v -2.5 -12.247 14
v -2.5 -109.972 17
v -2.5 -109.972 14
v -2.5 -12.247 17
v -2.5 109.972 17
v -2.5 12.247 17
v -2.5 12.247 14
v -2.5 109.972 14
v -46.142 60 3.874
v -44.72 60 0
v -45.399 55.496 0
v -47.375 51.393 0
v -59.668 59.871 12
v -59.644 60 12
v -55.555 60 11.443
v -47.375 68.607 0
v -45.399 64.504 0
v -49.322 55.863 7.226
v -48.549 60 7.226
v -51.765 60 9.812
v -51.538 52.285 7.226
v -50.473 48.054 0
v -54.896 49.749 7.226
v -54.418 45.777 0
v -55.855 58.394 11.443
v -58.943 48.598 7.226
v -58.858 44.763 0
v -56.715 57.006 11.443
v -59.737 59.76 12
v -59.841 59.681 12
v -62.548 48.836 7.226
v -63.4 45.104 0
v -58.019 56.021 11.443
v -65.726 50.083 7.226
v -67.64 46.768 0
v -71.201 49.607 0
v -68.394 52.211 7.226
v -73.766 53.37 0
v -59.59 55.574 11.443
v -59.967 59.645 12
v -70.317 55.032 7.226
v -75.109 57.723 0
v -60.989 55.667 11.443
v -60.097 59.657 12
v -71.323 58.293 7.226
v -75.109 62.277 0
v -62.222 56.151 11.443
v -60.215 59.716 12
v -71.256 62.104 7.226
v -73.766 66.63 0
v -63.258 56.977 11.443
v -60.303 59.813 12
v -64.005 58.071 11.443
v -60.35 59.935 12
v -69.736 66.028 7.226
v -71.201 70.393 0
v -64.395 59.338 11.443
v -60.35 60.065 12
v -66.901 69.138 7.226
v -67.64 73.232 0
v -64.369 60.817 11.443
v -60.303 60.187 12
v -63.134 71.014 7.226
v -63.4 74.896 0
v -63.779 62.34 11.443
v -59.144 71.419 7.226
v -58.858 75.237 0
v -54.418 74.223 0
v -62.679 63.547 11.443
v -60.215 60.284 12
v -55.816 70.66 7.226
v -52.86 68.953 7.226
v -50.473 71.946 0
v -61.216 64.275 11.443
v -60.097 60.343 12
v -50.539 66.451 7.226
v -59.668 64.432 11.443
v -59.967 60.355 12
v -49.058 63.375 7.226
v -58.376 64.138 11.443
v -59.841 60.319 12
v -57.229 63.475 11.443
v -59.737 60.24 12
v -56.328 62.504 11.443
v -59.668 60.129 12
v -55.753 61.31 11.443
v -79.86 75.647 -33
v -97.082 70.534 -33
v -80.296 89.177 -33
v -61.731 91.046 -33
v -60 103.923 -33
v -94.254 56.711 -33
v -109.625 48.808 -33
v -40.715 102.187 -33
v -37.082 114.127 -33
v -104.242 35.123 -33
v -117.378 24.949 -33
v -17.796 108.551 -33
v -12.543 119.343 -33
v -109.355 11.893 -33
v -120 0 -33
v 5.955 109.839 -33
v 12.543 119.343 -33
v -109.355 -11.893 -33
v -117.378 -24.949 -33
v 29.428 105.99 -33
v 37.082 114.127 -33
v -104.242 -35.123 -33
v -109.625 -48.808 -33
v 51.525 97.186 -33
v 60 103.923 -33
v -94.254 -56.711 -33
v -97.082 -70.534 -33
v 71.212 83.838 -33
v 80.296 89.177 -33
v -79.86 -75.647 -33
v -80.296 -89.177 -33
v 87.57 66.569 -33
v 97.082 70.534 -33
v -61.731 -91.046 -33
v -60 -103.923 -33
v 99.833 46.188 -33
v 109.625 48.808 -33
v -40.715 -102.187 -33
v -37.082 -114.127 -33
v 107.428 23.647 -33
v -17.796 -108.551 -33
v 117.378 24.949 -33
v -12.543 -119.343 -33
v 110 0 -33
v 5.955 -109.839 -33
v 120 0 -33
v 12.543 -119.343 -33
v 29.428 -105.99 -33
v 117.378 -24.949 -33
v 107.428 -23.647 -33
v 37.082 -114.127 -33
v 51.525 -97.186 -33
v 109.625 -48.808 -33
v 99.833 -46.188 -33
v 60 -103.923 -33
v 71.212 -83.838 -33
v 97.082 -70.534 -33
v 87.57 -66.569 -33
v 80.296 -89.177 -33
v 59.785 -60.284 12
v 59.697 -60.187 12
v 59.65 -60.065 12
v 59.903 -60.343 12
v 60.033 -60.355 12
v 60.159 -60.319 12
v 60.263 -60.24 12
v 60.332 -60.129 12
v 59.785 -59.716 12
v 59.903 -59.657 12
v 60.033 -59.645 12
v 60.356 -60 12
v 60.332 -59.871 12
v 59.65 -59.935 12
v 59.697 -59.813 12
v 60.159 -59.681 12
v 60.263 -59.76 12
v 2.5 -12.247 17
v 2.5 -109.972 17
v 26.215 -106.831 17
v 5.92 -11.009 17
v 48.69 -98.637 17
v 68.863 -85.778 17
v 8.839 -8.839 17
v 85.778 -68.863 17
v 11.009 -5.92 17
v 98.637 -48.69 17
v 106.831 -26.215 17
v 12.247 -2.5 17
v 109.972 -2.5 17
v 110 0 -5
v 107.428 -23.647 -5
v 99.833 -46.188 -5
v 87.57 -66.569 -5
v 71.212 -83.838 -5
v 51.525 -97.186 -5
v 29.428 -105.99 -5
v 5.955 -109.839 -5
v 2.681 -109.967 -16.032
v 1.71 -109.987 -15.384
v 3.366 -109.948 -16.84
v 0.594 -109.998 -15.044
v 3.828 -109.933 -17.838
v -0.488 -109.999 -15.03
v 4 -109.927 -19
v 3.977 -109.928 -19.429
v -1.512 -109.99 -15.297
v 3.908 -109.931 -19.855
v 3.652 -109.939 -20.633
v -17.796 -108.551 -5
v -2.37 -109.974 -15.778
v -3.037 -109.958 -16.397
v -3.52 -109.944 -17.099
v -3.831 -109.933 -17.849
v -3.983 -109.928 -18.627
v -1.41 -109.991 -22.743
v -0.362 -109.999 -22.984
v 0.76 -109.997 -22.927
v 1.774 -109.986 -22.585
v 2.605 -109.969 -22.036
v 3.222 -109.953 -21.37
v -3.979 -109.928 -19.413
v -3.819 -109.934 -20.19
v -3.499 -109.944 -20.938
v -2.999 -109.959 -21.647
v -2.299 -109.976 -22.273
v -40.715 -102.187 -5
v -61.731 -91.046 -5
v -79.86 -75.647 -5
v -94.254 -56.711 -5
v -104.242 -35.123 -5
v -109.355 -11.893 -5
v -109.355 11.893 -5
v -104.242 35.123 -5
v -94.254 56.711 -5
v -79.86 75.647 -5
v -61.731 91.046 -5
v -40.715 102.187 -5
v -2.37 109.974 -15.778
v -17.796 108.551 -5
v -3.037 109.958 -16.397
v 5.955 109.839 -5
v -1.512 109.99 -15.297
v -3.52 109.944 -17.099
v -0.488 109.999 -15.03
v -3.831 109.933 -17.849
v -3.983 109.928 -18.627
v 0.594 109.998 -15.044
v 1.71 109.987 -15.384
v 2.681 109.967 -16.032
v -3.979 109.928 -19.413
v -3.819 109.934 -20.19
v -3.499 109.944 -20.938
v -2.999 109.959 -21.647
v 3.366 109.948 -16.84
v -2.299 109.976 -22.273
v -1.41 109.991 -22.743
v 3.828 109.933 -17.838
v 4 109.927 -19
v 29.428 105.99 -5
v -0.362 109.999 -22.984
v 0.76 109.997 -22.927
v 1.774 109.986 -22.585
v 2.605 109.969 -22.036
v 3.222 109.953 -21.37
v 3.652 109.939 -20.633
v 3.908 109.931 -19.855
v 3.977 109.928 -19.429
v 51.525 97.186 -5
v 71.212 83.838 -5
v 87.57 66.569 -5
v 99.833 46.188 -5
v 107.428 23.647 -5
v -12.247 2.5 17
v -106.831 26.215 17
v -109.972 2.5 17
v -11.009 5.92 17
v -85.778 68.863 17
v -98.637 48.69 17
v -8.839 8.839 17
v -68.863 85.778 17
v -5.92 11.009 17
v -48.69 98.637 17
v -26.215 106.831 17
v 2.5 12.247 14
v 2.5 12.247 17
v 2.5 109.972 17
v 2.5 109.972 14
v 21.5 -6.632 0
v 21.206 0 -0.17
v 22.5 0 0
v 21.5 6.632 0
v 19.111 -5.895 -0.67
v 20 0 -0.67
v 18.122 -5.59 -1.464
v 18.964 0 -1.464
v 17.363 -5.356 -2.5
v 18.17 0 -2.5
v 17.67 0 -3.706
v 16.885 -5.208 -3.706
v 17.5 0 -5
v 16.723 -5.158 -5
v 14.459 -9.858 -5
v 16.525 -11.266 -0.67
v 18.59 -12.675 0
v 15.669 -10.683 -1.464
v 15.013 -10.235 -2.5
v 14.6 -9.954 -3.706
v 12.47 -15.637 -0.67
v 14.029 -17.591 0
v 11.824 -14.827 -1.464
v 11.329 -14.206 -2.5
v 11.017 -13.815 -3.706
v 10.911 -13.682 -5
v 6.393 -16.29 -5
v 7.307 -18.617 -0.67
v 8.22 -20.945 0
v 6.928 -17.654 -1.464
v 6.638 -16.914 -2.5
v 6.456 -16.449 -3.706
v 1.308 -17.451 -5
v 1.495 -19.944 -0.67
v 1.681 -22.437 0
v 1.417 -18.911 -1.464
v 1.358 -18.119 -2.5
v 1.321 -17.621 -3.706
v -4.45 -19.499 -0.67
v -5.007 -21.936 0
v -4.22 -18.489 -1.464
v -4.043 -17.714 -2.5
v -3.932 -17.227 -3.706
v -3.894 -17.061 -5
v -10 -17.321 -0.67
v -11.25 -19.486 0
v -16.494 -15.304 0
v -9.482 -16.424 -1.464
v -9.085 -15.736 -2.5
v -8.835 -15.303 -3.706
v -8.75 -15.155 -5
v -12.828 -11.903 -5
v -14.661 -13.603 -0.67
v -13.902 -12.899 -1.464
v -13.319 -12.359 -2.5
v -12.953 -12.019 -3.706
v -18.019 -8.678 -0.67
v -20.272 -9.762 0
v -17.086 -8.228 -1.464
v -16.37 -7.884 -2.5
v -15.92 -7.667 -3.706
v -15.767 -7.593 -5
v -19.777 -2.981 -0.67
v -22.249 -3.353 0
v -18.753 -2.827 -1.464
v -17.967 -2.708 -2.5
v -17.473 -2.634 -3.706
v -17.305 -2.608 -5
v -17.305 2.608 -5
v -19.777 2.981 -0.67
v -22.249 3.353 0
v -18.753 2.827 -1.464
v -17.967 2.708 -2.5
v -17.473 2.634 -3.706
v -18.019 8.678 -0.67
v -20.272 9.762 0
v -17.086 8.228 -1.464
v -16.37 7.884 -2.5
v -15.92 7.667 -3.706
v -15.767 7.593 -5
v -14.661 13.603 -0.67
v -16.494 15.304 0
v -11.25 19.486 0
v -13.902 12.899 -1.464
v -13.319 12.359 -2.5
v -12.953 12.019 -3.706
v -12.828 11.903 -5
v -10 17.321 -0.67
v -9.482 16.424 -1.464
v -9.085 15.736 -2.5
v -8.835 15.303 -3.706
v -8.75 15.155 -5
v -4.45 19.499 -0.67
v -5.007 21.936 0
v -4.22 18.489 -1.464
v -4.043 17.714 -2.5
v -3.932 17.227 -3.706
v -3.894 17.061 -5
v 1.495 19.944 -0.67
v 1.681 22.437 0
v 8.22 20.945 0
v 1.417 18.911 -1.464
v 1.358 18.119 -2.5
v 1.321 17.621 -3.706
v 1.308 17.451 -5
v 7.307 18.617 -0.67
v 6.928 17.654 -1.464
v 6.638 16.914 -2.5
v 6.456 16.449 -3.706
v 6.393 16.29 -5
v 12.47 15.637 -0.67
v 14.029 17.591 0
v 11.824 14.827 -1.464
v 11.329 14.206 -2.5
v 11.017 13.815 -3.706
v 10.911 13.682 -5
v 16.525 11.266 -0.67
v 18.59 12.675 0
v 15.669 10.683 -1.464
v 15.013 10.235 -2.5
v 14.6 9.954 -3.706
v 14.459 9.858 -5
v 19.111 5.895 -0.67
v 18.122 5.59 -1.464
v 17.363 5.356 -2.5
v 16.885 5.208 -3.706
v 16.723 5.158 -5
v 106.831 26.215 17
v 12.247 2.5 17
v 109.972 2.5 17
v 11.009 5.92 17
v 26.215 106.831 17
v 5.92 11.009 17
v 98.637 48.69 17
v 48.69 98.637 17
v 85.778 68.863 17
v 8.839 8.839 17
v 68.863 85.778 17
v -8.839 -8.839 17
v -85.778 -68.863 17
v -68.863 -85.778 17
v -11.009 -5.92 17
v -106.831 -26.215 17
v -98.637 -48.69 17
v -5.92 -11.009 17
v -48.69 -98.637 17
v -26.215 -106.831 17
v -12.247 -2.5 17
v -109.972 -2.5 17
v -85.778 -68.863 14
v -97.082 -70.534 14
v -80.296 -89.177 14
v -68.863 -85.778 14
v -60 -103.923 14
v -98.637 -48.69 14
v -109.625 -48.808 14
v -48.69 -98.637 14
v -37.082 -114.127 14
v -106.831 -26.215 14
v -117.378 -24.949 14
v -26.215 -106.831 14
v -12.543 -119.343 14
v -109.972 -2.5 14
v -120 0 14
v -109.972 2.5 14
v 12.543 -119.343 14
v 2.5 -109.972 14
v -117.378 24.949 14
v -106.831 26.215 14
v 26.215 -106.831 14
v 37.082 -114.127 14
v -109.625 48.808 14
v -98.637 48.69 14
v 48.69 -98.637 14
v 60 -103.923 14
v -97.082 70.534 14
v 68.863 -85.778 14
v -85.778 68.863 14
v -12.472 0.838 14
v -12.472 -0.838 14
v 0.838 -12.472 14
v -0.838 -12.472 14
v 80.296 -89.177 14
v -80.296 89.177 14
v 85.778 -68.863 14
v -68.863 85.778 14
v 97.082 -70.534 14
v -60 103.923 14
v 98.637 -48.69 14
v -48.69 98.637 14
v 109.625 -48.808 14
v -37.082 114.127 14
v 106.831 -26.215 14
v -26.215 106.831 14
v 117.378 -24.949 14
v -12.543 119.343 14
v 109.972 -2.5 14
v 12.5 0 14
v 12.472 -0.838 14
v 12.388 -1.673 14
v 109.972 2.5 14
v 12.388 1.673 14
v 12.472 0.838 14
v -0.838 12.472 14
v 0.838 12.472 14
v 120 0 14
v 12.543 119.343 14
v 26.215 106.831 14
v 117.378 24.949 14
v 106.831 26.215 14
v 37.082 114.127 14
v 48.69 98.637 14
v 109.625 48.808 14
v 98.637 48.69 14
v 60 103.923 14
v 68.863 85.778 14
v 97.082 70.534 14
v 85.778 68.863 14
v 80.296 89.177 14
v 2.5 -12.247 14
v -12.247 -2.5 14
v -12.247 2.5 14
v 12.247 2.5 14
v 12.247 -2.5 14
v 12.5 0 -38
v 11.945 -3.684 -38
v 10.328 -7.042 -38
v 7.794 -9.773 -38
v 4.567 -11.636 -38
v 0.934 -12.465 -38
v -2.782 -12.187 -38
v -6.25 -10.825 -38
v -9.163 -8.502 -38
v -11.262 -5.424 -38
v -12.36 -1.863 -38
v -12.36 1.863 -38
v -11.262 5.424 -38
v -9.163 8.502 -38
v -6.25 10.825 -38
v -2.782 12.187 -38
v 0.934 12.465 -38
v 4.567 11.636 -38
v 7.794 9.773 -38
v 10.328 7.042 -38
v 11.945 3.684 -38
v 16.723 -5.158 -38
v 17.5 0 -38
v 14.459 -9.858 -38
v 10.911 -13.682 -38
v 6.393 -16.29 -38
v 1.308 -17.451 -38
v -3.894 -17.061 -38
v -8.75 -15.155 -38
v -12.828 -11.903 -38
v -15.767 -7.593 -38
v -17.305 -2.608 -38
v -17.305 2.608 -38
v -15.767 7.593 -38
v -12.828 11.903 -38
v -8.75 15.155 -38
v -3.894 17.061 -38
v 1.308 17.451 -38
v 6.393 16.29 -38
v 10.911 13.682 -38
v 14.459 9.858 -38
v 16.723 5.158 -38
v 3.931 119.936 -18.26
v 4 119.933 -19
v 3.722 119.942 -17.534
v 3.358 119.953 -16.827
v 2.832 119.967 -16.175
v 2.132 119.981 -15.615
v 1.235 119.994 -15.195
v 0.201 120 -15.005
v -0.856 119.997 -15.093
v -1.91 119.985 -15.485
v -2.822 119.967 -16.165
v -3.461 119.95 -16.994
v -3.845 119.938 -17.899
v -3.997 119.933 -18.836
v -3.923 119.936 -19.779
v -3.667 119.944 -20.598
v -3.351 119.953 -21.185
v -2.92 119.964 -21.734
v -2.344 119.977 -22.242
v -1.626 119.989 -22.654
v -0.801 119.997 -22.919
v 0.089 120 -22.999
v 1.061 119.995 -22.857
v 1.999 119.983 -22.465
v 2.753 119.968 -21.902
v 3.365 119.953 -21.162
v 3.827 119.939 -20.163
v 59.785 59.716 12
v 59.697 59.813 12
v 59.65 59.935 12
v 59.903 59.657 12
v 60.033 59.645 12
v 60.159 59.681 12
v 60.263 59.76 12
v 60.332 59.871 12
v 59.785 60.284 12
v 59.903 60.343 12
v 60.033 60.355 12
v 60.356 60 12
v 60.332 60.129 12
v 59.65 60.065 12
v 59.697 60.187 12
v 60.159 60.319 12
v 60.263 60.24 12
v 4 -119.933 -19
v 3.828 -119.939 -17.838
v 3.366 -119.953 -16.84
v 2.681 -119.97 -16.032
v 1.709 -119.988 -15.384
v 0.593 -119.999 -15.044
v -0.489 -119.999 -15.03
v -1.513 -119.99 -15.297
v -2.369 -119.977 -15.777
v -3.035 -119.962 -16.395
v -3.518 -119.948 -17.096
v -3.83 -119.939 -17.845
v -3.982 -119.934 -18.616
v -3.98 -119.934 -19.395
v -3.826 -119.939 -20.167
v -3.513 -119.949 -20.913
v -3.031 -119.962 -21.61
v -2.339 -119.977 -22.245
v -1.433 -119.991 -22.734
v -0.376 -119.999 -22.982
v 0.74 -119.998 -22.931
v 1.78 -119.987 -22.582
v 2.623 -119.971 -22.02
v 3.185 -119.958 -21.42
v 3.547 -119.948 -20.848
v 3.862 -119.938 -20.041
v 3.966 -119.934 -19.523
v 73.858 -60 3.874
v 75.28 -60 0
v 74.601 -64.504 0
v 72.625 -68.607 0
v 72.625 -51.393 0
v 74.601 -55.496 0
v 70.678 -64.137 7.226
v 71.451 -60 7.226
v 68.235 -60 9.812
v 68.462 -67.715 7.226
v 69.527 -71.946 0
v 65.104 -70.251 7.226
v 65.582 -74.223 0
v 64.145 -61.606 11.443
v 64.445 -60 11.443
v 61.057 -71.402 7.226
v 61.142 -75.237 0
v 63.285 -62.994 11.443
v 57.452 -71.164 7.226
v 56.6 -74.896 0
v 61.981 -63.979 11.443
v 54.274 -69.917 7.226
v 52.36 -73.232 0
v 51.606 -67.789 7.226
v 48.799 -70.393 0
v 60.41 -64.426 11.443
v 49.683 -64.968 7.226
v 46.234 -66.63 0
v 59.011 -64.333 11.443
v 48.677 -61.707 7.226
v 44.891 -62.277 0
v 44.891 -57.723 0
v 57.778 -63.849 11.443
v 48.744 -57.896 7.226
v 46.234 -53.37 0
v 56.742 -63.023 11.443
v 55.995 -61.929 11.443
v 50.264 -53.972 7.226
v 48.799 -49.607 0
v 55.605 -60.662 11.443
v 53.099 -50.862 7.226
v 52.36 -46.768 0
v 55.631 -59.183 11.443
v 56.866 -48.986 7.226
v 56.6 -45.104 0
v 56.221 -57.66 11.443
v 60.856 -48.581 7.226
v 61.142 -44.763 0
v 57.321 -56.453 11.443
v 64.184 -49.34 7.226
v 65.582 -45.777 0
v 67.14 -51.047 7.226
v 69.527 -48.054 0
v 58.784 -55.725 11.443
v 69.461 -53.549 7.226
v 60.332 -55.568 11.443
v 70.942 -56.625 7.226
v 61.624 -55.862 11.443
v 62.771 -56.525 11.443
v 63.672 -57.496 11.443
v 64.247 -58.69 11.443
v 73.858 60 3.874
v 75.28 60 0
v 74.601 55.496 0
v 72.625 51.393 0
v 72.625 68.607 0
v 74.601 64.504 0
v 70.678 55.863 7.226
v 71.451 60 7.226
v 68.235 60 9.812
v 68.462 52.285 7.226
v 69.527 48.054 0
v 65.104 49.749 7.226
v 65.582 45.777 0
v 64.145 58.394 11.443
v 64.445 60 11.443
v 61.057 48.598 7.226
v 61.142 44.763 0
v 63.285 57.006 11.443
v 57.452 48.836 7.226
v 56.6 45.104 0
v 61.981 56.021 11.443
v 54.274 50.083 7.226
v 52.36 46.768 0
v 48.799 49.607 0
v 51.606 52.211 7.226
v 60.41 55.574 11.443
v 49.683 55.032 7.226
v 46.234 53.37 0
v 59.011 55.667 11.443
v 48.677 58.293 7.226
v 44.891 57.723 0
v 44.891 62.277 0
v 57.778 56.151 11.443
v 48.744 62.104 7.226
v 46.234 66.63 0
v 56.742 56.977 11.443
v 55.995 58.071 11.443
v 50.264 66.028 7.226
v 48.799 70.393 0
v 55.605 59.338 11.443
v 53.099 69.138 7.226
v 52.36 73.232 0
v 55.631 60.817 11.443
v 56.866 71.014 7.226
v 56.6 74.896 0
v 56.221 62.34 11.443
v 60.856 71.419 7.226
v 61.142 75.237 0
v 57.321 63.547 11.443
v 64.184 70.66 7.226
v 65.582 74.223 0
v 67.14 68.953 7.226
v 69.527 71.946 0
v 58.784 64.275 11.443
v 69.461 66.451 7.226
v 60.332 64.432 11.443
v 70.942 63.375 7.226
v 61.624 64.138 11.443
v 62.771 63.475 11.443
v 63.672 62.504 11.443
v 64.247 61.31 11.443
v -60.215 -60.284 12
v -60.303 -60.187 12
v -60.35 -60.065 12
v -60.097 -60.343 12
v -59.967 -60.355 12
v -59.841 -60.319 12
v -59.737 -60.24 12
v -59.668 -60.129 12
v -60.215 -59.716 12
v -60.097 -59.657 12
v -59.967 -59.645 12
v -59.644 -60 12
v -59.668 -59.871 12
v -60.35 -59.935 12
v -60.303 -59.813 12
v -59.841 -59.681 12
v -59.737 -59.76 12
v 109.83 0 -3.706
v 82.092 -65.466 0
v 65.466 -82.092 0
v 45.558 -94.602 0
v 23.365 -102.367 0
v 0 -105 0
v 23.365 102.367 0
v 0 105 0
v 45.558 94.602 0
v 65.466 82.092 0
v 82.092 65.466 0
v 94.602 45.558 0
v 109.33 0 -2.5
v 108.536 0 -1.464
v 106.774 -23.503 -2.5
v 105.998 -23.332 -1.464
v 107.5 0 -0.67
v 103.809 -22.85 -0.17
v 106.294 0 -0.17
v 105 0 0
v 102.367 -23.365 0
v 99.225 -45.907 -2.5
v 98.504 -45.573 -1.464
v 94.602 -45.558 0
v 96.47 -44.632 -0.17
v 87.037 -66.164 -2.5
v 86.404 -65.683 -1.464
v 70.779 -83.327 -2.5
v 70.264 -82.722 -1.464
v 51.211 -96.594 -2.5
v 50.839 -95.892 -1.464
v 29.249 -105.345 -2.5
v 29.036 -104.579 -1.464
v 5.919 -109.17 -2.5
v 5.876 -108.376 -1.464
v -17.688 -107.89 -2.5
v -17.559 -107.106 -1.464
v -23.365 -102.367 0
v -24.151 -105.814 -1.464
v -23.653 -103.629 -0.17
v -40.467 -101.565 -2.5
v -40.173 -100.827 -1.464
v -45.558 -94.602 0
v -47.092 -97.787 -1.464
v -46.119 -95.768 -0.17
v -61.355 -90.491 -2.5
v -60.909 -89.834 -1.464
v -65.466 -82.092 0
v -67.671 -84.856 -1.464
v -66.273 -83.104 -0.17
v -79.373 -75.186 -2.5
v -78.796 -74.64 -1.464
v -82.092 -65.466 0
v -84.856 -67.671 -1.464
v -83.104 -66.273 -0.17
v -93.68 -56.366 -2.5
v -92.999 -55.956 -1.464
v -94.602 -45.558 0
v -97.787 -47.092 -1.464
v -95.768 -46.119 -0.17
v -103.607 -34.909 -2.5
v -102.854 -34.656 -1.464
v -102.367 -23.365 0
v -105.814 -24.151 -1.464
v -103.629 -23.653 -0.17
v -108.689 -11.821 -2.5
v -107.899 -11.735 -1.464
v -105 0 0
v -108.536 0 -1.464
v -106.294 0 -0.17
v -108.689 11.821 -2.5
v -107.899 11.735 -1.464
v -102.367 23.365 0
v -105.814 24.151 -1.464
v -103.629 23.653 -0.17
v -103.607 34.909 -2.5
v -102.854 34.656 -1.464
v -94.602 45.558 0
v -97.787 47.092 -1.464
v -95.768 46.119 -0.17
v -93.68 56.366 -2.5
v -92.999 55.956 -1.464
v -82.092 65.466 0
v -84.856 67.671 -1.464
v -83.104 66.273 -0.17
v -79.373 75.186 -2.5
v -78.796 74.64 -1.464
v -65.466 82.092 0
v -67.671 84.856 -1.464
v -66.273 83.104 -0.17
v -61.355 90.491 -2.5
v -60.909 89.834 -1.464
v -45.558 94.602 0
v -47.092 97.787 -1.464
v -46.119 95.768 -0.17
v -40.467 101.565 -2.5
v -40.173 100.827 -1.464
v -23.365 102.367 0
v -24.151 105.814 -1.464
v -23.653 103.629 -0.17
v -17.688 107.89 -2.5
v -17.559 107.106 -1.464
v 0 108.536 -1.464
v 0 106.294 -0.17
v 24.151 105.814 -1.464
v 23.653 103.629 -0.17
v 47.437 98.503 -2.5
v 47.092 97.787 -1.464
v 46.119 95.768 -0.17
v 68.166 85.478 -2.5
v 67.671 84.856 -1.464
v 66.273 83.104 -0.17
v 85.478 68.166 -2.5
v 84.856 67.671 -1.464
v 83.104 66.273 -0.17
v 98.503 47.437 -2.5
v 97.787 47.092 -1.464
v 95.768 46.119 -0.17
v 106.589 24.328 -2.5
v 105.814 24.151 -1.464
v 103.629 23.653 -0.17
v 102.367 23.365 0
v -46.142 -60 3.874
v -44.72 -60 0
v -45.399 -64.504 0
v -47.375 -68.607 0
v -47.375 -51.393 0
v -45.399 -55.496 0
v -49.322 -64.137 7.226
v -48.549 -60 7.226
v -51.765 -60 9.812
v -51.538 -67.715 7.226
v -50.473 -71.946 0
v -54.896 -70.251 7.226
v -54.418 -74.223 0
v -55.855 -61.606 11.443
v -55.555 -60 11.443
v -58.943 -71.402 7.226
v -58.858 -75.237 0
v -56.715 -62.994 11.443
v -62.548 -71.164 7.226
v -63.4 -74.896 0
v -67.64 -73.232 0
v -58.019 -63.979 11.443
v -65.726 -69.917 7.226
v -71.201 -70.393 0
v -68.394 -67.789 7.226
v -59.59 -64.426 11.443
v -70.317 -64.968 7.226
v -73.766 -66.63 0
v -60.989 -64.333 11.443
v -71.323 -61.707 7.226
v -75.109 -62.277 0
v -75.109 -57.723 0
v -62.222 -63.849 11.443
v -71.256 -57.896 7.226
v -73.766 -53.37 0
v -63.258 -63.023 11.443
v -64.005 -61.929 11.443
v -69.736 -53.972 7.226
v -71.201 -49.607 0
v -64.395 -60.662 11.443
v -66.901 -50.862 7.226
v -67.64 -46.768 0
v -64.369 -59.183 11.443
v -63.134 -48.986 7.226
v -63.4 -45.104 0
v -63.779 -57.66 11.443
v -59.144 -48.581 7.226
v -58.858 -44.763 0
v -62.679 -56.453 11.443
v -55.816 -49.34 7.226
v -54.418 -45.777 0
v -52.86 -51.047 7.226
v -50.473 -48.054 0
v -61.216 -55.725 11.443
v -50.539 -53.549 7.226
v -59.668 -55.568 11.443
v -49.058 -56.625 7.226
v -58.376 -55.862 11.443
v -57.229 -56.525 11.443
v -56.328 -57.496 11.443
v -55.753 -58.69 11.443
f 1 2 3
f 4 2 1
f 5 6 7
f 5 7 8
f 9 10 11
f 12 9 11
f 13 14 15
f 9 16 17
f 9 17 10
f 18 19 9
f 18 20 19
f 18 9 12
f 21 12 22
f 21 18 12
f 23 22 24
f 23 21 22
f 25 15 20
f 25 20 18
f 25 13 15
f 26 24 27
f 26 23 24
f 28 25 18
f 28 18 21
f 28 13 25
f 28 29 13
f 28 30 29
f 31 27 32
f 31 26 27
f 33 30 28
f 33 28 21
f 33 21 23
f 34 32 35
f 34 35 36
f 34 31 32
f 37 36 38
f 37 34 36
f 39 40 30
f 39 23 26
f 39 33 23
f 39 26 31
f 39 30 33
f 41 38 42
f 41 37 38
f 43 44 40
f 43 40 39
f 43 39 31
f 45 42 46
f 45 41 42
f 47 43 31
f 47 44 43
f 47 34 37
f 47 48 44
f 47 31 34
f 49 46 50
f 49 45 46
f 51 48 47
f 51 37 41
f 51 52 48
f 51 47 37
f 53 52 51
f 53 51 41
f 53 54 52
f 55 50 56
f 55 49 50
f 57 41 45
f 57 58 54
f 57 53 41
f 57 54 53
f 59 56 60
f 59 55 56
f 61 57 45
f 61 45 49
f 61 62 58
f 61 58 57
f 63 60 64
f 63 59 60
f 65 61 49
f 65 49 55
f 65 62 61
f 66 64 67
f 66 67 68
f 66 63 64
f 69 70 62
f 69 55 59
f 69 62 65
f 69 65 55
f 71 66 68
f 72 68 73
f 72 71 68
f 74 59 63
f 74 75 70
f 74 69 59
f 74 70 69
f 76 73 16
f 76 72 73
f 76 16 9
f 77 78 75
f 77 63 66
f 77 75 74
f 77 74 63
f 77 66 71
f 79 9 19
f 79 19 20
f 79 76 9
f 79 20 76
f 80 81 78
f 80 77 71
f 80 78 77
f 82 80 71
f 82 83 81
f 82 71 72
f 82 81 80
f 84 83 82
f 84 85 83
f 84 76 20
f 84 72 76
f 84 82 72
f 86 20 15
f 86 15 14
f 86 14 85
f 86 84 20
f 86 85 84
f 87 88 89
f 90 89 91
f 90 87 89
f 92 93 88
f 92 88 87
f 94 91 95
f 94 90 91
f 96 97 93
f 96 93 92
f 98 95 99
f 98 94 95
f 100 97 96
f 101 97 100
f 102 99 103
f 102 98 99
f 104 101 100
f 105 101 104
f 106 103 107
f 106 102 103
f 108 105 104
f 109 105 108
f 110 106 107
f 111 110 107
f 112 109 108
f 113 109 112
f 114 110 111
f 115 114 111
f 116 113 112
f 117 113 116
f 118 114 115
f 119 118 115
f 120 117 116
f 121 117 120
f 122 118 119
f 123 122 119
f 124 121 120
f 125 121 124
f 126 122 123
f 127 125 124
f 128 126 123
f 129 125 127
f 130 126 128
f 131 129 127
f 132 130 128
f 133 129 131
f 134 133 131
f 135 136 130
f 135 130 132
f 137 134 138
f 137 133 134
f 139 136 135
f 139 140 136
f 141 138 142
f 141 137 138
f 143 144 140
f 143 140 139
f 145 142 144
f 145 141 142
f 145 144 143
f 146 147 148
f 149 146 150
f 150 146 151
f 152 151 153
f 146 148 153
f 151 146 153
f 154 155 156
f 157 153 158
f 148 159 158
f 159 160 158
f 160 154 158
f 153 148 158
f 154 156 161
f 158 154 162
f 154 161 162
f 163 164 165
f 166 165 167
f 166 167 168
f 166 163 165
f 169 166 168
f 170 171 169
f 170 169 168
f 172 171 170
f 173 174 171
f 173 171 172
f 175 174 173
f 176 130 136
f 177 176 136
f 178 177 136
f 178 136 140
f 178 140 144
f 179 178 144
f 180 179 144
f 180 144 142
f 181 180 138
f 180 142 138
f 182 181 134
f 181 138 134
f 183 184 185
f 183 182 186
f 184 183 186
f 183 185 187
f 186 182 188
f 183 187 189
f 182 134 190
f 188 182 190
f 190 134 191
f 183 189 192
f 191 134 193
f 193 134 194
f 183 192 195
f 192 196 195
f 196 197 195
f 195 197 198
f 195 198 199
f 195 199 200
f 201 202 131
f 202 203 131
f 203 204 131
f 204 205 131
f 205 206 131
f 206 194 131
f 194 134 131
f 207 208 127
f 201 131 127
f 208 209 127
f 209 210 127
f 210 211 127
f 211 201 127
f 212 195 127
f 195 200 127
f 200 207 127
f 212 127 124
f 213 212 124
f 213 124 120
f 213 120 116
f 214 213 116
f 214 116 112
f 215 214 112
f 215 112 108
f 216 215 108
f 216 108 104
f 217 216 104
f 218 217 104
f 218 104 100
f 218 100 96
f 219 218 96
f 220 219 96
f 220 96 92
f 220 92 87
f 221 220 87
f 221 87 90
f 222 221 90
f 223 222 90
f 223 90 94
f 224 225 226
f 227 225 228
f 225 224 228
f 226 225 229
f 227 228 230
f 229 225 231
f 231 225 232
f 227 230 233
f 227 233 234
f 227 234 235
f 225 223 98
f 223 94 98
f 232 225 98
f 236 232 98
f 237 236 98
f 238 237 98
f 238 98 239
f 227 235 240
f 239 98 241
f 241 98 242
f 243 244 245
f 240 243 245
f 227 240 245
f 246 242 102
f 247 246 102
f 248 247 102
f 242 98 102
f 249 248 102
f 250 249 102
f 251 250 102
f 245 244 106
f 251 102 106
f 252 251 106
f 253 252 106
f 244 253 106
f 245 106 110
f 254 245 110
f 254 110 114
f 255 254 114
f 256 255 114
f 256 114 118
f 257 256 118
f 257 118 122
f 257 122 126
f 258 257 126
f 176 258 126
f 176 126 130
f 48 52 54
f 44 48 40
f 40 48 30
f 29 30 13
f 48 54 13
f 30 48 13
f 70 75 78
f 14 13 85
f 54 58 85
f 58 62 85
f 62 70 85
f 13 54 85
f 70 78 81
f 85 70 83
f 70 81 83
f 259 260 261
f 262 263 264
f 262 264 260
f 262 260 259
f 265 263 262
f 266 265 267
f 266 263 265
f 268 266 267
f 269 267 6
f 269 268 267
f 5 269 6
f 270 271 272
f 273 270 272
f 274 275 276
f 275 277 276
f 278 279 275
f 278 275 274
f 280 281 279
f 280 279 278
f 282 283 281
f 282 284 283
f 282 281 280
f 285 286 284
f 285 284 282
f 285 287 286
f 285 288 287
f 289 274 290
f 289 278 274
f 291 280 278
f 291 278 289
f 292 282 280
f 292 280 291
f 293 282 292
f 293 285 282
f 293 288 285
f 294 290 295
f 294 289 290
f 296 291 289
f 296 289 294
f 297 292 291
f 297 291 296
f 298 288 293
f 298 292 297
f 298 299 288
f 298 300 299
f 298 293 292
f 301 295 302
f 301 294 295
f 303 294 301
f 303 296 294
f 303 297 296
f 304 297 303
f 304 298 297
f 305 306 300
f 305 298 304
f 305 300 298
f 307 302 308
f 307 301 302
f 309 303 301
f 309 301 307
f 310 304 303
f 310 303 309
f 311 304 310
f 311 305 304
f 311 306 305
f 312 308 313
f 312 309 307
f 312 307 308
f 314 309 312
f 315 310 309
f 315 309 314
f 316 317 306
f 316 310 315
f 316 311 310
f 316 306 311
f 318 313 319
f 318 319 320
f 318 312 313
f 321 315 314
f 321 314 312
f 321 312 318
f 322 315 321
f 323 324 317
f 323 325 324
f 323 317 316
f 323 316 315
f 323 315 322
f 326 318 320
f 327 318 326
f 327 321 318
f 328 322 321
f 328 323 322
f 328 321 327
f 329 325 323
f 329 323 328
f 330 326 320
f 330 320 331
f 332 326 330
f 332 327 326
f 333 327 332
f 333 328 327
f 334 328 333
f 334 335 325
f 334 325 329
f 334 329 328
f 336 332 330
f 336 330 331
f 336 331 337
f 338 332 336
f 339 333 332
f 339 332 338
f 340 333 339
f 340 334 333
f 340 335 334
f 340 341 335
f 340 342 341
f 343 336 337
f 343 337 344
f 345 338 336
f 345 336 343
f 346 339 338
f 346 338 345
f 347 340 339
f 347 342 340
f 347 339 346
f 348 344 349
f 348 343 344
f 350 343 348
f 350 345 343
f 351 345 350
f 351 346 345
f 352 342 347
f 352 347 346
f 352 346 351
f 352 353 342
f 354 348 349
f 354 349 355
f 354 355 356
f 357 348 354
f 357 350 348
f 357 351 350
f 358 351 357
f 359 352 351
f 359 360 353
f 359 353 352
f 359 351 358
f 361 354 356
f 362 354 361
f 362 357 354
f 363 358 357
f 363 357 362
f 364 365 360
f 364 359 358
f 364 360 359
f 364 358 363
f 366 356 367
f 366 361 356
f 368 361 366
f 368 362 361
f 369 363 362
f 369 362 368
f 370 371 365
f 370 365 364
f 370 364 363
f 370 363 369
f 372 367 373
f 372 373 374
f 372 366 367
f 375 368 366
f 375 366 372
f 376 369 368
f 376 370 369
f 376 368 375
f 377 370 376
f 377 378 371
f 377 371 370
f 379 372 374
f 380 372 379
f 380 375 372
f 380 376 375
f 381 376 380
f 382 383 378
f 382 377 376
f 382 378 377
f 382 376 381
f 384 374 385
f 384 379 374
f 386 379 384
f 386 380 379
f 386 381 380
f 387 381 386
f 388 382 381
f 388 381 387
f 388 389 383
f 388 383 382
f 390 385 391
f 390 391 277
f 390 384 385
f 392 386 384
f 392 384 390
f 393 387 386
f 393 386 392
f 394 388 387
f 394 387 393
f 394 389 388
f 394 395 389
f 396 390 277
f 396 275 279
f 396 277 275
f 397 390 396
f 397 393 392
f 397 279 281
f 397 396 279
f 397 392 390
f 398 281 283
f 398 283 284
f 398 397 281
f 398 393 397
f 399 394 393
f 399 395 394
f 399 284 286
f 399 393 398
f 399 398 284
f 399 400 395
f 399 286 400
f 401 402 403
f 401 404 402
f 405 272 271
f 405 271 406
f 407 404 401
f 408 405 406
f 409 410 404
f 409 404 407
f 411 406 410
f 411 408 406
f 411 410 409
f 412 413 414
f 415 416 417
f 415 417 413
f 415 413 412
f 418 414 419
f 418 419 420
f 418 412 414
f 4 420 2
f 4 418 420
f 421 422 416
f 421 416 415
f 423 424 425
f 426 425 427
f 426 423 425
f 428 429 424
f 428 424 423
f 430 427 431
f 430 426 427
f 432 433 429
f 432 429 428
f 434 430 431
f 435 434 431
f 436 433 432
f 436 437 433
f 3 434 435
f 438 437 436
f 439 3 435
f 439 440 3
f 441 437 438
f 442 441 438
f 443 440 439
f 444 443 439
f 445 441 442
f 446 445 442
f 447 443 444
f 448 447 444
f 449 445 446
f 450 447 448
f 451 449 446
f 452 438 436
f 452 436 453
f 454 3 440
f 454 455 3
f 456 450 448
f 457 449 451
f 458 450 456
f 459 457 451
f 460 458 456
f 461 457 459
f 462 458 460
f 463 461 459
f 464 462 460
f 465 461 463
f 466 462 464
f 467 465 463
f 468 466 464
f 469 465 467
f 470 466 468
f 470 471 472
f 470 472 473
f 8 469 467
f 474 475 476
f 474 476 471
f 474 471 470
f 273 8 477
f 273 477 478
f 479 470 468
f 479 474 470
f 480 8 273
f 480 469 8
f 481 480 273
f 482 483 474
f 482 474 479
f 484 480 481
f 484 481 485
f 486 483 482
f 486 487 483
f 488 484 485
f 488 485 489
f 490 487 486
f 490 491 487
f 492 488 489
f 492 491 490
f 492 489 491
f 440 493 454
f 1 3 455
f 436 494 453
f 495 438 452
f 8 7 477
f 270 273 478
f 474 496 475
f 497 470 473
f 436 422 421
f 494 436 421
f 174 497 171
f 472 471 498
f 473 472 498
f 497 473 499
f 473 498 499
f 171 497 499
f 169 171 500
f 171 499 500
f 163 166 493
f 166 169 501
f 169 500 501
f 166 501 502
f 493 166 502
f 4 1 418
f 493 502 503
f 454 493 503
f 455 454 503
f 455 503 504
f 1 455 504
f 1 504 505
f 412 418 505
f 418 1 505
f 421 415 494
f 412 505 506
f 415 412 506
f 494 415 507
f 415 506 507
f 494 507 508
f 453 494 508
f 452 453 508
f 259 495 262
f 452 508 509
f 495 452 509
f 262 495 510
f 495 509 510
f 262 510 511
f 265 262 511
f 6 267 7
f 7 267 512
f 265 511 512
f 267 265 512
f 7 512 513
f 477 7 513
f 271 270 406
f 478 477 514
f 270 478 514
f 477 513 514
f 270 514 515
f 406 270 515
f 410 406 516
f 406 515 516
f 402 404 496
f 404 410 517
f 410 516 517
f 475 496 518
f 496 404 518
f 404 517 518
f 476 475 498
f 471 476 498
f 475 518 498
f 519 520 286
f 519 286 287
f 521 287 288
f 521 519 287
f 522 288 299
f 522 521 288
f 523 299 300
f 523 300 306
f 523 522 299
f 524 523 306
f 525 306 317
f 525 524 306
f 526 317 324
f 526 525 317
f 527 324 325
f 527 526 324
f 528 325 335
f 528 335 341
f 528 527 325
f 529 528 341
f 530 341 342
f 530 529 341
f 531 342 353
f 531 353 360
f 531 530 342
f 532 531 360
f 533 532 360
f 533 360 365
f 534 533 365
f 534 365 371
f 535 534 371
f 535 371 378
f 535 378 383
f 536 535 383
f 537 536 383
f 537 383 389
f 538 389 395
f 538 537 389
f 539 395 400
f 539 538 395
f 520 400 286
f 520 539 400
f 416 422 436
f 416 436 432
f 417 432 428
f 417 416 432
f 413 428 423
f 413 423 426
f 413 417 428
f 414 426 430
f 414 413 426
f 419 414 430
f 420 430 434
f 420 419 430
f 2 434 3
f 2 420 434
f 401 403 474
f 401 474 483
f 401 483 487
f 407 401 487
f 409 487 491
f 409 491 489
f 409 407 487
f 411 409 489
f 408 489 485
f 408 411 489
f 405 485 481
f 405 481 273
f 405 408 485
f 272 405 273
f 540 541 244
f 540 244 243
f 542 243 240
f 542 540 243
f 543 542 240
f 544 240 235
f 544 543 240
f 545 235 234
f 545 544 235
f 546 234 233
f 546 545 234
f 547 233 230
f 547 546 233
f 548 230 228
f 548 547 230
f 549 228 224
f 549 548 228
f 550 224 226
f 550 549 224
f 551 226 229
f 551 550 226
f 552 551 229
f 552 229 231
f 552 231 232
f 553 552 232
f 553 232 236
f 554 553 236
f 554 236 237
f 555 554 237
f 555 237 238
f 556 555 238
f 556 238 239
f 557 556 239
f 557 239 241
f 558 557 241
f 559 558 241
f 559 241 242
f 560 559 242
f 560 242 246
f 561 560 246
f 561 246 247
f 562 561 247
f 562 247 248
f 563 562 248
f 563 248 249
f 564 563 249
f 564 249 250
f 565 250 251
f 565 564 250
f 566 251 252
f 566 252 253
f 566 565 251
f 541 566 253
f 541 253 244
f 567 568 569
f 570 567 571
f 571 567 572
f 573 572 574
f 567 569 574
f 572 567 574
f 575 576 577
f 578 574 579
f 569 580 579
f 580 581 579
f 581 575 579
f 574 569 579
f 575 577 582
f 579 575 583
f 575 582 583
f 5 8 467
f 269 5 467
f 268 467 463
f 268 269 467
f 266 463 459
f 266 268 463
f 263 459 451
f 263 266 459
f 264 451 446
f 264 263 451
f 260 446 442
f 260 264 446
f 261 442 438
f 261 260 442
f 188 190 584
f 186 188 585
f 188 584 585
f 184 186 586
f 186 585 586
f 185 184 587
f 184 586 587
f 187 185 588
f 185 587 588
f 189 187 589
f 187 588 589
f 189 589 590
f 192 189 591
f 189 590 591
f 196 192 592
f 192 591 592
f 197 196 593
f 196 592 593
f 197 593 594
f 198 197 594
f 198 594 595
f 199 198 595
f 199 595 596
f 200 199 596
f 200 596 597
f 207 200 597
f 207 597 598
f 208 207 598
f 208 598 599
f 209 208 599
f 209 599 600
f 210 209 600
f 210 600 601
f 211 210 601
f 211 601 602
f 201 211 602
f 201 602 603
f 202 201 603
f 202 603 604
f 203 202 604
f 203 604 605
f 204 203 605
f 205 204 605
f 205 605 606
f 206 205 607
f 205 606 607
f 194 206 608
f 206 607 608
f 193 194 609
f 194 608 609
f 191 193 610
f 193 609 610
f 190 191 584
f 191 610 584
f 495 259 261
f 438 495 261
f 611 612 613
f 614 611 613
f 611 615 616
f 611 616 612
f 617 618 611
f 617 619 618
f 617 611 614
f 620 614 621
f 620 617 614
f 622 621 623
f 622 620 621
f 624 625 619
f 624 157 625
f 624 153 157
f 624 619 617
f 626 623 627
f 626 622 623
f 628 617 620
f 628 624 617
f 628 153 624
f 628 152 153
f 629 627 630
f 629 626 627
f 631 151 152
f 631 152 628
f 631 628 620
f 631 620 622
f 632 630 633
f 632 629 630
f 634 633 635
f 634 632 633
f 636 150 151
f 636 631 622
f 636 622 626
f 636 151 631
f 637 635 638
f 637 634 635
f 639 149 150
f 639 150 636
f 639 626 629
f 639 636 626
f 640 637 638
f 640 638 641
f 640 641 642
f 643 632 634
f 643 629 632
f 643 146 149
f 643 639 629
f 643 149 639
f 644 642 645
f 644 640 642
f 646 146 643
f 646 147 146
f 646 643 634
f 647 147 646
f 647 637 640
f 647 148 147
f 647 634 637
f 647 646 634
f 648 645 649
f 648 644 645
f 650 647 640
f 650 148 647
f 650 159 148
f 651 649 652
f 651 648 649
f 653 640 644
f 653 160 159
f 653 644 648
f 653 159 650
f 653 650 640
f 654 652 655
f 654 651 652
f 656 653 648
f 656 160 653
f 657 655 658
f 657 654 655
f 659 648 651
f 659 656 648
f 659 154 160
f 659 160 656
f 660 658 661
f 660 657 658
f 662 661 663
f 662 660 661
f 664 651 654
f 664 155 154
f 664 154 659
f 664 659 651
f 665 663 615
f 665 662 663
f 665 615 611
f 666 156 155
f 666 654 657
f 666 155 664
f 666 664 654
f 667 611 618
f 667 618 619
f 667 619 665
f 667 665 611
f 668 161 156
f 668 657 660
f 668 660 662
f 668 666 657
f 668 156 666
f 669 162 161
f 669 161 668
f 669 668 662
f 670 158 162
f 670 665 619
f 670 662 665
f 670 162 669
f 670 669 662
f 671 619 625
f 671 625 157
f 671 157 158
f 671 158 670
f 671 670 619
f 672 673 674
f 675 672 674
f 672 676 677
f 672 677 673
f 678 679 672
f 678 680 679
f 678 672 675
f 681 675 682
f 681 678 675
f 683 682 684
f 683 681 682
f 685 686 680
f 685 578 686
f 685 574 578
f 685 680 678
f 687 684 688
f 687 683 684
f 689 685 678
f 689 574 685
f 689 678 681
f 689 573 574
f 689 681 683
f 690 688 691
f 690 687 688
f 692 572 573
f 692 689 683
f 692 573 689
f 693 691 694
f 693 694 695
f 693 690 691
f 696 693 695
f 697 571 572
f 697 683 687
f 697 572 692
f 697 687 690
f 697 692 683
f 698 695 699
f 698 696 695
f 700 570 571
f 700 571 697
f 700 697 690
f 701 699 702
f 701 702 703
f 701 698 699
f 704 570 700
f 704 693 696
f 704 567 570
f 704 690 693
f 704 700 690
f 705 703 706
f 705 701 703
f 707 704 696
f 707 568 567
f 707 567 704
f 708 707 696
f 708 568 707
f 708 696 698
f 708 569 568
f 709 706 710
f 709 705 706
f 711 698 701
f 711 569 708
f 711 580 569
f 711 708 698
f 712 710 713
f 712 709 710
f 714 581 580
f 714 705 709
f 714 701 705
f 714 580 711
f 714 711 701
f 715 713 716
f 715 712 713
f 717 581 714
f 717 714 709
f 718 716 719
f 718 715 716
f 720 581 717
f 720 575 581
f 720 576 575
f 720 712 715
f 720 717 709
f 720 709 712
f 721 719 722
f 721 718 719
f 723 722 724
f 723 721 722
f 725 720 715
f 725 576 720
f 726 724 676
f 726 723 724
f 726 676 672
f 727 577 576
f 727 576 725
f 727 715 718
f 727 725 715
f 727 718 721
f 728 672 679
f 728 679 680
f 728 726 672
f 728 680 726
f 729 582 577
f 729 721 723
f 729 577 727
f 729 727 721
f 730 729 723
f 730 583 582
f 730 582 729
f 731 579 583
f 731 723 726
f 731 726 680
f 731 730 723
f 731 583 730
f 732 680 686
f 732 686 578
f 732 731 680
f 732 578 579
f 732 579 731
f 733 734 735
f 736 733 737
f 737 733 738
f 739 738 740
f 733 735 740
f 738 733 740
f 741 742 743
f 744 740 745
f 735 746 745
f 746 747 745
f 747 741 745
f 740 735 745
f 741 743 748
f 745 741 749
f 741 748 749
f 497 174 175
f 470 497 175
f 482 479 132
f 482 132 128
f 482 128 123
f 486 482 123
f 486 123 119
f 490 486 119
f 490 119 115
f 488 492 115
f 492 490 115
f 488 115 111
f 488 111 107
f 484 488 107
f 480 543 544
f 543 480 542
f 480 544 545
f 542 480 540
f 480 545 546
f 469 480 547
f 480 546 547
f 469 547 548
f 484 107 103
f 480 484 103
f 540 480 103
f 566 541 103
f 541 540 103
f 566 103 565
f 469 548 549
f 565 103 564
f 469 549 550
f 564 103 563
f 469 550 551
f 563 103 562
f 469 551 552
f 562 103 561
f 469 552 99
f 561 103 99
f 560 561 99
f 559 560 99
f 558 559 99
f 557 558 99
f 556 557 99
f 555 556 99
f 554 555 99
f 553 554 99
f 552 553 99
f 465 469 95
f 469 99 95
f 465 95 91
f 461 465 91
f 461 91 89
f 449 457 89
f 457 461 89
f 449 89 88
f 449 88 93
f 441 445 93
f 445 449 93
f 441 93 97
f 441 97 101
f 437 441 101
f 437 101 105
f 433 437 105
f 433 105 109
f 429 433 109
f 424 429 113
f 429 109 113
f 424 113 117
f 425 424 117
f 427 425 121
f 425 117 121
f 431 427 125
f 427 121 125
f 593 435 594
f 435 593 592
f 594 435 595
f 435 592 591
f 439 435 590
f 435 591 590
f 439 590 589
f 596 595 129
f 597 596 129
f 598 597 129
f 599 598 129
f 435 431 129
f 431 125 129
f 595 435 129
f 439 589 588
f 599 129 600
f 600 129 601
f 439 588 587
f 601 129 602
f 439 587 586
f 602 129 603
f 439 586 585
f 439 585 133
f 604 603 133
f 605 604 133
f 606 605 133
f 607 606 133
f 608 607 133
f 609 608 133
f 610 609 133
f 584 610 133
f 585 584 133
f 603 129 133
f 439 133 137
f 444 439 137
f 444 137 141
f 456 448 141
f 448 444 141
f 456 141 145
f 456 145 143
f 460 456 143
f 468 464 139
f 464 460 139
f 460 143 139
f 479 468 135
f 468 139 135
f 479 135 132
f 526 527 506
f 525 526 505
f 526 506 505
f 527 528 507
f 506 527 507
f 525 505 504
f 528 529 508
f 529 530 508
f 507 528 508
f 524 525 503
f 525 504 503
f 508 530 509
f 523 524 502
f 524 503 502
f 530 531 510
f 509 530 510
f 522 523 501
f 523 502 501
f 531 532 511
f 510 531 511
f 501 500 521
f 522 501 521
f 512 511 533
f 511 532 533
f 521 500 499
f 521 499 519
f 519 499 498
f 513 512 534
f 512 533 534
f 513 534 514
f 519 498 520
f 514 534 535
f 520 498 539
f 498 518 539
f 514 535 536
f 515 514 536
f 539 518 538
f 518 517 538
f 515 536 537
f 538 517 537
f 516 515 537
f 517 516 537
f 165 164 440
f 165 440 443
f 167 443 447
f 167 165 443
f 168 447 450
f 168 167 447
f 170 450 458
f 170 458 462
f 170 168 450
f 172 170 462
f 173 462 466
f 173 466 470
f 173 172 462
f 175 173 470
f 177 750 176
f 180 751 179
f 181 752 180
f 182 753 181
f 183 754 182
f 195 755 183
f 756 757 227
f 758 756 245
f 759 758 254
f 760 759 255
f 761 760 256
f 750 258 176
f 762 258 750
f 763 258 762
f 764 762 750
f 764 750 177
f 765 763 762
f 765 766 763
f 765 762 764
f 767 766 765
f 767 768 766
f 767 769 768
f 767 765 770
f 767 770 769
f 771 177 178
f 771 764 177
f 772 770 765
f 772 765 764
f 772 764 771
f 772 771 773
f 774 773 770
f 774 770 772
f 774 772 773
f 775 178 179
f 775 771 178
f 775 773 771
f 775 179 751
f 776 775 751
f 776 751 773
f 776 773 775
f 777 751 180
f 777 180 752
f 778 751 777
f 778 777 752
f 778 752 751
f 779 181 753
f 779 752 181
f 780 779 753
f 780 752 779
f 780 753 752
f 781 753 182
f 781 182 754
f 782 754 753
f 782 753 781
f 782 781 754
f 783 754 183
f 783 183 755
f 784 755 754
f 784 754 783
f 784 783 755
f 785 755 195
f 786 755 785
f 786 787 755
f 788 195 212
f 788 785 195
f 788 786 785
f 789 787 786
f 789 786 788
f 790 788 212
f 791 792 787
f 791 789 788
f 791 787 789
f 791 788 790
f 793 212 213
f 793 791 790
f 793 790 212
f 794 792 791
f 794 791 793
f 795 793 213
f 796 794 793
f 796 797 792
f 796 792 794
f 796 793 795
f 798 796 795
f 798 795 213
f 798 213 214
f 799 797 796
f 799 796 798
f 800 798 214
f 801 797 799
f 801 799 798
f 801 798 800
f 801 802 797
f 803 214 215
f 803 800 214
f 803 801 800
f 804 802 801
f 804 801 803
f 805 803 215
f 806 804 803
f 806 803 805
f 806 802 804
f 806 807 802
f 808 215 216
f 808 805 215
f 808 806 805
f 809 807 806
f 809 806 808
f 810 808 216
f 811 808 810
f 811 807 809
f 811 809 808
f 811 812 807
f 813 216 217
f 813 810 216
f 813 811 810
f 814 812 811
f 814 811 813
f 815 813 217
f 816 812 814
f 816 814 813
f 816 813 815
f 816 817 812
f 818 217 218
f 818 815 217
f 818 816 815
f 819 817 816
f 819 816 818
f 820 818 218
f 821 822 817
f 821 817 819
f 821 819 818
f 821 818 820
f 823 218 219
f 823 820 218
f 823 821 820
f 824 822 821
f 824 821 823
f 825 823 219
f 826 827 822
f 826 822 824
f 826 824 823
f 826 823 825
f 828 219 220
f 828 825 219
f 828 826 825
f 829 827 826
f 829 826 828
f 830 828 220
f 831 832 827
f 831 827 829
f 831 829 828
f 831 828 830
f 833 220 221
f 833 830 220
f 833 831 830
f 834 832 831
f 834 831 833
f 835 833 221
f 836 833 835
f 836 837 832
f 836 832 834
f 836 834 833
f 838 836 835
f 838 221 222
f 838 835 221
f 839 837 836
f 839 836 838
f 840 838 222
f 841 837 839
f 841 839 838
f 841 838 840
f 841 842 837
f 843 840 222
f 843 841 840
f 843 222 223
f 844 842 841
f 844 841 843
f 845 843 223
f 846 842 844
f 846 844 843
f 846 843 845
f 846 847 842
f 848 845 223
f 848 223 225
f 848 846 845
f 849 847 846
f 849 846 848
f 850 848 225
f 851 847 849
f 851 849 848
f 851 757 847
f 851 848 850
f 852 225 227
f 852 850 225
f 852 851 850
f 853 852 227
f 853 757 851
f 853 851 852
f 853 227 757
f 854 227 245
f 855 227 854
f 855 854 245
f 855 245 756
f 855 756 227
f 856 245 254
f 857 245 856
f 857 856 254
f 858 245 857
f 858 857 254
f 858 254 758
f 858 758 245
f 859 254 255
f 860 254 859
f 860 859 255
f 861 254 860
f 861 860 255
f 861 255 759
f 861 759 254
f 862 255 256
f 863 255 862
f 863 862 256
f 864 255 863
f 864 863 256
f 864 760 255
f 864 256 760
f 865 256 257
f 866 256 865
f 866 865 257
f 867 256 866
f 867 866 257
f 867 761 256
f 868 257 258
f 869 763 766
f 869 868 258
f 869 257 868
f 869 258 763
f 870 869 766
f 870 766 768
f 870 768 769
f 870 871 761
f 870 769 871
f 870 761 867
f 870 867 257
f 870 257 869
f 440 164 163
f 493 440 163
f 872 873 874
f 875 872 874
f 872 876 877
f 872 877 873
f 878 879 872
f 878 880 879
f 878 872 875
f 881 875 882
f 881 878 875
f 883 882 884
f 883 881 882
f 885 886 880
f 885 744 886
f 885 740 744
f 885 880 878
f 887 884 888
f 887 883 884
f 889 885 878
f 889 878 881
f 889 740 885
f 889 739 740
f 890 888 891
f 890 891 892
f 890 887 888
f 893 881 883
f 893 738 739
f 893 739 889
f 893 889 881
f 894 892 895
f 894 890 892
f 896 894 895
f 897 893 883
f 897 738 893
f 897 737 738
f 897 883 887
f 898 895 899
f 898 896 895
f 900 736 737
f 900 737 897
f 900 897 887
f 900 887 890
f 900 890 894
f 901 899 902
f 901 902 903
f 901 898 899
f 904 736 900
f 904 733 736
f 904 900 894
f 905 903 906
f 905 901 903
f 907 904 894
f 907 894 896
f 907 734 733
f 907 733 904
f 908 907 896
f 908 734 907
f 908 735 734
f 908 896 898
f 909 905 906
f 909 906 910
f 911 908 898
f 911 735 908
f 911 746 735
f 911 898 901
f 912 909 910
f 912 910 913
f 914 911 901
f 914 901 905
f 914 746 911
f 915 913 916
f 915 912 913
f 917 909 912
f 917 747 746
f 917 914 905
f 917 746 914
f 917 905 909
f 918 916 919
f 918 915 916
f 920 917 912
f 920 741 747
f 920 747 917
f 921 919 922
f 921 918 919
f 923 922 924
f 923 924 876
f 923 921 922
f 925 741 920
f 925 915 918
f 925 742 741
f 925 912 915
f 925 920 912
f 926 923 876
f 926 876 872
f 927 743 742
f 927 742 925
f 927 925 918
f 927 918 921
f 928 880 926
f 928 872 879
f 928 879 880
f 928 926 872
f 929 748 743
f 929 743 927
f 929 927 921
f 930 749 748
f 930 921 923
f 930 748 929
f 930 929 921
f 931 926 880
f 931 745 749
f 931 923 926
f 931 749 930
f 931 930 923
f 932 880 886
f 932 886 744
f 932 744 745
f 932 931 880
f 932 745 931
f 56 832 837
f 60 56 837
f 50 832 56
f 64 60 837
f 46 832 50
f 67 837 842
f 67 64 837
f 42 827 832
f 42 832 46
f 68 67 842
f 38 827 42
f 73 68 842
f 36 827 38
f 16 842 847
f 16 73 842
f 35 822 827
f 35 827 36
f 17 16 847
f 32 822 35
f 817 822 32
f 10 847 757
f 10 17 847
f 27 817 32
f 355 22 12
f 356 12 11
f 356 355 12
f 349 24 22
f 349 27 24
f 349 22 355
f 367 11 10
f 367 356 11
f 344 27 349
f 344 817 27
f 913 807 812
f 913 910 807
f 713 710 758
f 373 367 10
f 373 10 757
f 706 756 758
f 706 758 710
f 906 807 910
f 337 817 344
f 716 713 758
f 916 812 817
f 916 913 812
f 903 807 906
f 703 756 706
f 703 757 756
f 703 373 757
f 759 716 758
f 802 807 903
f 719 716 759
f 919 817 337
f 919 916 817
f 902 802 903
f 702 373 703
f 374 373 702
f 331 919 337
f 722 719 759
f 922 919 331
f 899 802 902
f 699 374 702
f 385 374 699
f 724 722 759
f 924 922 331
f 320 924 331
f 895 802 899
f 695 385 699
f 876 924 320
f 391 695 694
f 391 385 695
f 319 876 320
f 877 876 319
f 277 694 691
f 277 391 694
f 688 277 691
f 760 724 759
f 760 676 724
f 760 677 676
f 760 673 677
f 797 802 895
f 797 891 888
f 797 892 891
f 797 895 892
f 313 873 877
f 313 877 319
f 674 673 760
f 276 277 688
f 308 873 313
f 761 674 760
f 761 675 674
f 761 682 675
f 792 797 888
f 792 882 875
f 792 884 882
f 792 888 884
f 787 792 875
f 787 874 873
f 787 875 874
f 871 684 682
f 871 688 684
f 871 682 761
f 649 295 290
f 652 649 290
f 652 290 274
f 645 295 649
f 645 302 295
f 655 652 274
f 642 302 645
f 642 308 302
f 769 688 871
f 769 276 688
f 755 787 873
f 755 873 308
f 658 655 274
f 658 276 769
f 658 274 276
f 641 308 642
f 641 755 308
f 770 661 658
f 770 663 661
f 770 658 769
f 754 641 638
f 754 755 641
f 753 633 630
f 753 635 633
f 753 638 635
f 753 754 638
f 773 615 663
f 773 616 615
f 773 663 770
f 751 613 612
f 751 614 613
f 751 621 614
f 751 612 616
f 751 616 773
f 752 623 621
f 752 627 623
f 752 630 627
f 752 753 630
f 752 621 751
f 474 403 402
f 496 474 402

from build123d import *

# Parameters (mm, degrees)
F0_R          = 120
F1_DEPTH      = 12
F1_DEPTH_BACK = 38
F2_R          = 110
F2_R_2        = 17.5
F3_DEPTH      = 38
F4_R          = 5
F5_R          = 15.2795
F6_DEPTH      = 15.2795
F8_R          = 120
F9_DEPTH      = 5
F10_R         = 12.5
F11_DEPTH     = 55.001
F12_R         = 120
F12_R_2       = 110
F13_DEPTH     = 3
F14_W         = 5
F14_H         = 122.5
F14_W_2       = 122.5
F14_H_2       = 5
F15_DEPTH     = 3
F16_R         = 136.7884680592
F16_R_2       = 100.9393969777
F17_DEPTH     = 5
F19_R         = 4
F20_DEPTH     = 25
F22_R         = 4
F23_DEPTH     = 25


# Not quite as in the source:
# - a fillet or chamfer that OpenCascade refuses, or shapes differently, is made with other operations: its cross-section is extruded or revolved along the edge and cut away or added


with BuildPart() as f1:
    # F0 (on Top) → F1 (new body, two sides)
    with BuildSketch(Plane.XY) as f1_sk:
        Circle(F0_R)
    extrude(amount=F1_DEPTH)
    extrude(f1_sk.sketch, amount=-F1_DEPTH_BACK)

    # F2 (on face) → F3 (cut)
    with BuildSketch(Plane(origin=(0, 0, -38), x_dir=(1, 0, 0), z_dir=(0, 0, -1))):
        Circle(F2_R)
        Circle(F2_R_2, mode=Mode.SUBTRACT)
    extrude(amount=-F3_DEPTH, mode=Mode.SUBTRACT)

    # F4
    f4_edges = [f1.edges().sort_by_distance(p)[0] for p in [
        (-17.5, 0, 0),
        (-110, 0, 0),
    ]]
    fillet(f4_edges, radius=F4_R)

    # F5 (on face) → F6 (cut)
    with BuildSketch(Plane(origin=(0, 0, 0), x_dir=(1, 0, 0), z_dir=(0, 0, -1))):
        with Locations((-60, 60)):
            Circle(F5_R)
        with Locations((-60, -60)):
            Circle(F5_R)
        with Locations((60, -60)):
            Circle(F5_R)
        with Locations((60, 60)):
            Circle(F5_R)
    extrude(amount=-F6_DEPTH, mode=Mode.SUBTRACT)

    # F8 (on face) → F9 (join)
    with BuildSketch(Plane.XY.offset(12)):
        Circle(F8_R)
    extrude(amount=F9_DEPTH)

    # F10 (on face) → F11 (cut, through all)
    with BuildSketch(Plane(origin=(0, 0, -38), x_dir=(1, 0, 0), z_dir=(0, 0, -1))):
        Circle(F10_R)
    extrude(amount=-F11_DEPTH, mode=Mode.SUBTRACT)

    # F12 (on face) → F13 (cut)
    with BuildSketch(Plane.XY.offset(17)):
        Circle(F12_R)
        Circle(F12_R_2, mode=Mode.SUBTRACT)
    extrude(amount=-F13_DEPTH, mode=Mode.SUBTRACT)

    # F14 (on face) → F15 (cut)
    with BuildSketch(Plane.XY.offset(17)):
        with Locations((0, -63.75)):
            Rectangle(F14_W, F14_H)
        with Locations((-63.75, 0)):
            Rectangle(F14_W_2, F14_H_2)
        Rectangle(F14_W, F14_H_2)
        with Locations((63.75, 0)):
            Rectangle(F14_W_2, F14_H_2)
        with Locations((0, 63.75)):
            Rectangle(F14_W, F14_H)
    extrude(amount=-F15_DEPTH, mode=Mode.SUBTRACT)

    # F16 (on face) → F17 (cut)
    with BuildSketch(Plane(origin=(0, 0, -38), x_dir=(1, 0, 0), z_dir=(0, 0, -1))):
        Circle(F16_R)
        Circle(F16_R_2, mode=Mode.SUBTRACT)
    extrude(amount=-F17_DEPTH, mode=Mode.SUBTRACT)

    # F18: fillet of radius 15.2795 on 4 edges, made by hand

    # F18_s1 → F18_t2 (revolve)
    with BuildSketch(Plane.XZ.offset(60)):
        with BuildLine():
            ThreePointArc((75.2795, 0), (69.9309062658, 8.6278977111), (60.3560955627, 12))
            Line((60.3560955627, 12), (75.2795, 12))
            Line((75.2795, 12), (75.2795, 0))
        make_face()
    revolve(axis=Axis((60, -60, 12), (0, 0, -1)))

    # F18_s3 → F18_t4 (revolve)
    with BuildSketch(Plane.XZ.offset(60)):
        with BuildLine():
            ThreePointArc((-44.7205, 0), (-50.0690937342, 8.6278977111), (-59.6439044373, 12))
            Line((-59.6439044373, 12), (-44.7205, 12))
            Line((-44.7205, 12), (-44.7205, 0))
        make_face()
    revolve(axis=Axis((-60, -60, 12), (0, 0, -1)))

    # F18_s5 → F18_t6 (revolve)
    with BuildSketch(Plane.XZ.offset(-60)):
        with BuildLine():
            ThreePointArc((-44.7205, 0), (-50.0690937342, 8.6278977111), (-59.6439044373, 12))
            Line((-59.6439044373, 12), (-44.7205, 12))
            Line((-44.7205, 12), (-44.7205, 0))
        make_face()
    revolve(axis=Axis((-60, 60, 12), (0, 0, -1)))

    # F18_s7 → F18_t8 (revolve)
    with BuildSketch(Plane.XZ.offset(-60)):
        with BuildLine():
            ThreePointArc((75.2795, 0), (69.9309062658, 8.6278977111), (60.3560955627, 12))
            Line((60.3560955627, 12), (75.2795, 12))
            Line((75.2795, 12), (75.2795, 0))
        make_face()
    revolve(axis=Axis((60, 60, 12), (0, 0, -1)))

    # F19 (on offset) → F20 (cut)
    with BuildSketch(Plane.XZ.offset(120)):
        with Locations((0, -19)):
            Circle(F19_R)
    extrude(amount=-F20_DEPTH, mode=Mode.SUBTRACT)

    # F22 (on offset) → F23 (cut)
    with BuildSketch(Plane.XZ.offset(-120)):
        with Locations((0, -19)):
            Circle(F22_R)
    extrude(amount=F23_DEPTH, mode=Mode.SUBTRACT)


solid = f1.part
